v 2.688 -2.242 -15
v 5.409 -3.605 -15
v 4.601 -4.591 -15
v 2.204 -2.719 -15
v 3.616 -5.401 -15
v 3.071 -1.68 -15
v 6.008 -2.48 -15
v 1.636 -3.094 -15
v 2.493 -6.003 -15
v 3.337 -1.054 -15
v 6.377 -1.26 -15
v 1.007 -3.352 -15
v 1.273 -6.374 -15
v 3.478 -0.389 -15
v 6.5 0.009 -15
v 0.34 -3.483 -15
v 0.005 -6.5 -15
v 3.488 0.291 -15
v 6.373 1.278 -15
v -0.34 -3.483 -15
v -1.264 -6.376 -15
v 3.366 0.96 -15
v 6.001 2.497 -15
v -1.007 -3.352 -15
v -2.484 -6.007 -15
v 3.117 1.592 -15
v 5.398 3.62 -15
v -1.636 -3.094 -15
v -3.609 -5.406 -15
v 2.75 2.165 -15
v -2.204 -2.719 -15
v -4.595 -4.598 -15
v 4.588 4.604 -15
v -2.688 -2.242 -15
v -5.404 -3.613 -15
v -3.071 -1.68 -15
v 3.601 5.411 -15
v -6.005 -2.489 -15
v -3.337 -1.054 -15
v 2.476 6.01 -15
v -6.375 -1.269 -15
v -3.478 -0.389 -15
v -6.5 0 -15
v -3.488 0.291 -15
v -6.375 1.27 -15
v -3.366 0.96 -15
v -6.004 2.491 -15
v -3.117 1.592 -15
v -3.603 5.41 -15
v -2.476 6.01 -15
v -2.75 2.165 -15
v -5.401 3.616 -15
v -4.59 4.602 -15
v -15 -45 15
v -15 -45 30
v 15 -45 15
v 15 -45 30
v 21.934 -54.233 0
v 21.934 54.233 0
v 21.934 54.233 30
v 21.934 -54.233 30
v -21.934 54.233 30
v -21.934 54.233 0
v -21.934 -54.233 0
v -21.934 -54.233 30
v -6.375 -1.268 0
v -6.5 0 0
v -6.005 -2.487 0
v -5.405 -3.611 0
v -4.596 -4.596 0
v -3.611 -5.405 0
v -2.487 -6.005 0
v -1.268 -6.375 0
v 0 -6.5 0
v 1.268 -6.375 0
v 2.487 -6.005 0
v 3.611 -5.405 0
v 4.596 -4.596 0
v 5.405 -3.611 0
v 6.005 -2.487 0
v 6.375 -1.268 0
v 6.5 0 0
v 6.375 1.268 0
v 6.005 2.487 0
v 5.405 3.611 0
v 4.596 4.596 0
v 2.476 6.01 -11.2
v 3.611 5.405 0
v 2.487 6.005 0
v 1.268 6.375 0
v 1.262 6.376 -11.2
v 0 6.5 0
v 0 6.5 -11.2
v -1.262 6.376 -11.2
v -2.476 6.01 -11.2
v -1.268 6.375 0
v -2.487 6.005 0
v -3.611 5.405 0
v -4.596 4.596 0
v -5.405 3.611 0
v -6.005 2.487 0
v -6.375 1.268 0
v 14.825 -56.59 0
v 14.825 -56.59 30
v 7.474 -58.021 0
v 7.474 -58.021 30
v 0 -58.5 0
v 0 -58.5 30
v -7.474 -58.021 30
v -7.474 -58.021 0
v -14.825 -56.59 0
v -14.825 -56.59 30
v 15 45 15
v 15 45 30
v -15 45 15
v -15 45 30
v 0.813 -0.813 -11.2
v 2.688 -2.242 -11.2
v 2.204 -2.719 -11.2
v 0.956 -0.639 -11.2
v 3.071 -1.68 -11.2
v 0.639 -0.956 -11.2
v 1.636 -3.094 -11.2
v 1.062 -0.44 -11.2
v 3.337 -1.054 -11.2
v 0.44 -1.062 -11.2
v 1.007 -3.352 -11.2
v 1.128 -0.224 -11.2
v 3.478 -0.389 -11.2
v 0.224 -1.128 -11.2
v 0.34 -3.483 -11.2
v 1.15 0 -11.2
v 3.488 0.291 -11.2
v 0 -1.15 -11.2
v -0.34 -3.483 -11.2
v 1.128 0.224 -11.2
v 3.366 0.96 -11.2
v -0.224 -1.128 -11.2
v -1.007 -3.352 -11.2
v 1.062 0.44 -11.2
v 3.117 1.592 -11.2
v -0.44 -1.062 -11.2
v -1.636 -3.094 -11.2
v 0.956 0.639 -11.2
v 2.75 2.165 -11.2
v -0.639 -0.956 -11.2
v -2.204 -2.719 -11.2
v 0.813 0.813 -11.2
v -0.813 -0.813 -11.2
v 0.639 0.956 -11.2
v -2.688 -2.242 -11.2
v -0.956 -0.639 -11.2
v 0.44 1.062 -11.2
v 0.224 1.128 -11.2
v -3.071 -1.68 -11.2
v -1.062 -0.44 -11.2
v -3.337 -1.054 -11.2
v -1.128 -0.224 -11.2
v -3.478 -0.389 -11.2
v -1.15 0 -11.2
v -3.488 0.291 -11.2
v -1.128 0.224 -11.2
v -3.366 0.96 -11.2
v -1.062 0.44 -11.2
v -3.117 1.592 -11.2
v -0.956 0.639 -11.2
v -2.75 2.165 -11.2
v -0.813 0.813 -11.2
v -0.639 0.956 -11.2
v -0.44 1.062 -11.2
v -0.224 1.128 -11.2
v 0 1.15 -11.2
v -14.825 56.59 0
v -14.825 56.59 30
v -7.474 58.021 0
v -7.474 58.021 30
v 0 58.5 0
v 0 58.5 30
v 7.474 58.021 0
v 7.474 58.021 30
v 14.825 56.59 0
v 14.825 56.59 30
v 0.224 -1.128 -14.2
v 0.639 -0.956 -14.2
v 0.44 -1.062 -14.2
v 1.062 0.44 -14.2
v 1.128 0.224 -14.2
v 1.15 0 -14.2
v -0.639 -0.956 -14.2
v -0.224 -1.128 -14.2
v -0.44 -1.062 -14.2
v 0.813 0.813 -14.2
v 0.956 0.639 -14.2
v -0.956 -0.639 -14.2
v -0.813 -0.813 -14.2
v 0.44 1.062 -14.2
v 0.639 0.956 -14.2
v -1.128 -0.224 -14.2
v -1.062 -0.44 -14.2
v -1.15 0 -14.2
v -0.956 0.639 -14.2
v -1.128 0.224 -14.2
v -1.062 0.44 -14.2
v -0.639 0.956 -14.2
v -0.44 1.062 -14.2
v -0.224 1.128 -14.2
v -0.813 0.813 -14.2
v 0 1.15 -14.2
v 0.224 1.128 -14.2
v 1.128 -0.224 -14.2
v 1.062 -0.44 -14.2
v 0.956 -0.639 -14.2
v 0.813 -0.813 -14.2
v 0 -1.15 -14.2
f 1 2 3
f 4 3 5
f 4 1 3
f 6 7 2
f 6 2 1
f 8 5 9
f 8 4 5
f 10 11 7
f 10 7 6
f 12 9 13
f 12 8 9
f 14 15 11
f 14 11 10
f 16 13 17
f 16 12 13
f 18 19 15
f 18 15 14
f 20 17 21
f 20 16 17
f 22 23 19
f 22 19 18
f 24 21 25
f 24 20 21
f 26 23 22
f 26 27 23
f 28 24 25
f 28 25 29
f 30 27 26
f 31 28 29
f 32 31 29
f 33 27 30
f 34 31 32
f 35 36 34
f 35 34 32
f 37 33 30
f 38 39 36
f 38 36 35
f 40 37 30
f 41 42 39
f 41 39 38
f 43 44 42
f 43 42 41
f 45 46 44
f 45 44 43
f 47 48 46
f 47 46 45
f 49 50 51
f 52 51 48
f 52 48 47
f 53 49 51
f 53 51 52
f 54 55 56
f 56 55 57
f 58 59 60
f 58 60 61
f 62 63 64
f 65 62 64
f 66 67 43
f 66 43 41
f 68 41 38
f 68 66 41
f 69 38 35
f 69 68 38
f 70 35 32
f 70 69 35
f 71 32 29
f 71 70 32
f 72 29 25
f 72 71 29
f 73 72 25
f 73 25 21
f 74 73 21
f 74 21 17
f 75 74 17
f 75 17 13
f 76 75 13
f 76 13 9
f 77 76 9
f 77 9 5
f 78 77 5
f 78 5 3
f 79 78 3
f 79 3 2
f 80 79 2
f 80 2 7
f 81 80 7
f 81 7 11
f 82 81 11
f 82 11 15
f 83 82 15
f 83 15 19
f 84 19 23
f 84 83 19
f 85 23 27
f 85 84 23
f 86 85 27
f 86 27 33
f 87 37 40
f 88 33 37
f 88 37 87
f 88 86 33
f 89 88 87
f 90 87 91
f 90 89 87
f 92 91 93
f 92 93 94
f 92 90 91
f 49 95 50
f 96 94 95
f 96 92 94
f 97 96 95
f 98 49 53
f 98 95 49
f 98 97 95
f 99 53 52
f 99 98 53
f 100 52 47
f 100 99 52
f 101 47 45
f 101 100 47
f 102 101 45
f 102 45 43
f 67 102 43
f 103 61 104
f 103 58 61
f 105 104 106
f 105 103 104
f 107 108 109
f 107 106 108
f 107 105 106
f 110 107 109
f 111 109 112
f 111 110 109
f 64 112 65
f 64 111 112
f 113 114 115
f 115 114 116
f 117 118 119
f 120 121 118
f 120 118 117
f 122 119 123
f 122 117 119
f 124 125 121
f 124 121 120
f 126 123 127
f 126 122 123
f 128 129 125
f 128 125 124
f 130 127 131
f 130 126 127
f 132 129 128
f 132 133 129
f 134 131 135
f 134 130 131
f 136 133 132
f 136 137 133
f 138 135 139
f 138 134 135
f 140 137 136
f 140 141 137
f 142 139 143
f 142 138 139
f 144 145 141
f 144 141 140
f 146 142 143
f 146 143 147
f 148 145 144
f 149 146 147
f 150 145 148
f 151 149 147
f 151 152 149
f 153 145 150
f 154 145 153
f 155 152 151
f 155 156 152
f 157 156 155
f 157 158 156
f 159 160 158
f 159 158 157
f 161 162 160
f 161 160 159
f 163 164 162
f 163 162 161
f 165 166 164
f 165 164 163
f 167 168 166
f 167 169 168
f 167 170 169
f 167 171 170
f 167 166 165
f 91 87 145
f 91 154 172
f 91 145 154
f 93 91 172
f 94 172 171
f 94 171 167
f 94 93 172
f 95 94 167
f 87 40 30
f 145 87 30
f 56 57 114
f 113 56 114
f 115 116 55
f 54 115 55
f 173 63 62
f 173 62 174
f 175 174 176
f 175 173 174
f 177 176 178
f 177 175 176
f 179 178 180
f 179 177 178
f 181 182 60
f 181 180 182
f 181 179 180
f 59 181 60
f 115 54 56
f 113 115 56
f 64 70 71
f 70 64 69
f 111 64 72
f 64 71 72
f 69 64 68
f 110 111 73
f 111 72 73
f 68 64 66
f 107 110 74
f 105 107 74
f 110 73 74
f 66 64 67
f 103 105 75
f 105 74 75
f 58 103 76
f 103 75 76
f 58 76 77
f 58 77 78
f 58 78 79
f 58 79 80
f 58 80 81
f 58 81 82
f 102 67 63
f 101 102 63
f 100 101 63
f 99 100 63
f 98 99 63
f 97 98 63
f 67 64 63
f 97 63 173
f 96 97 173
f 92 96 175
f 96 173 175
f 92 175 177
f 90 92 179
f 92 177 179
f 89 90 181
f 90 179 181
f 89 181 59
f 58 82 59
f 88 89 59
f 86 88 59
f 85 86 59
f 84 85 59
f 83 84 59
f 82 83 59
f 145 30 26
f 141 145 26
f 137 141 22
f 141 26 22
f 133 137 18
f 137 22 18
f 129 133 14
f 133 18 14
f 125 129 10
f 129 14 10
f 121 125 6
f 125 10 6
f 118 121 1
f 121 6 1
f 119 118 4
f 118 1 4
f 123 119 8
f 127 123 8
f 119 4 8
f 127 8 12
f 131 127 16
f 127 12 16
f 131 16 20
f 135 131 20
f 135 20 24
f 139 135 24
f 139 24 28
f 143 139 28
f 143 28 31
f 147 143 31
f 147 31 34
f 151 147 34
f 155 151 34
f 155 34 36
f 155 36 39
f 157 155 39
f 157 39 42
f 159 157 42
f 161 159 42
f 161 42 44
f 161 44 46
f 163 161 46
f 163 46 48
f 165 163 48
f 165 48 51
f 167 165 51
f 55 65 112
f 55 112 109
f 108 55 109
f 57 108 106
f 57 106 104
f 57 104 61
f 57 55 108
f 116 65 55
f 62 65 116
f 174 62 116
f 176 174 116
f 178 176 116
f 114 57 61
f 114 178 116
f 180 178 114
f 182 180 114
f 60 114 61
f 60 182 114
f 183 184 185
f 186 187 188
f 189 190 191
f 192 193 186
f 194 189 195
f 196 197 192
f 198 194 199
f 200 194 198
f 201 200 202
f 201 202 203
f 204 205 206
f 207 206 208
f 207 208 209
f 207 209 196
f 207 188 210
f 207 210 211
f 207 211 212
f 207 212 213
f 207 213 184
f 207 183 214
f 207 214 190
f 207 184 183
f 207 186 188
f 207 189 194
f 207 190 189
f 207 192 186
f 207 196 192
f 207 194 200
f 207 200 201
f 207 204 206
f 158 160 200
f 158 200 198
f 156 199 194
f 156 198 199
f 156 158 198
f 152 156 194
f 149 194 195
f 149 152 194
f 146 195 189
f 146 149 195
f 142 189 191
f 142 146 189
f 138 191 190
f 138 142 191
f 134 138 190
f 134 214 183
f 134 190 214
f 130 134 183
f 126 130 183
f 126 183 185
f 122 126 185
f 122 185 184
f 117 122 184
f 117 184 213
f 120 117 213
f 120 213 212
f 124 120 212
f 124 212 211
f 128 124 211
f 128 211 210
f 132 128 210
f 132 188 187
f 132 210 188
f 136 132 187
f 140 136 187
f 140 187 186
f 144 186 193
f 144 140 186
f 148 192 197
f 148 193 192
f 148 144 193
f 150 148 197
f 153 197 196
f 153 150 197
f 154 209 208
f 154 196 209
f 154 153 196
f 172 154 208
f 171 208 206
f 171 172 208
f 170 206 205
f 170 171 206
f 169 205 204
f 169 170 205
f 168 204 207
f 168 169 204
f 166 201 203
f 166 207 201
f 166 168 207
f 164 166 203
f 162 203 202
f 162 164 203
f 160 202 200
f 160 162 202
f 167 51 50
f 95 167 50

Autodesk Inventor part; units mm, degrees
ref_plane "YZ Plane" through (0, 0, 0) normal (1, 0, 0) x (0, 1, 0)
ref_plane "XZ Plane" through (0, 0, 0) normal (0, 1, 0) x (-1, 0, 0)
ref_plane "XY Plane" through (0, 0, 0) normal (0, 0, 1) x (1, 0, 0)
sketch "Sketch1" plane through (0, 0, 0) normal (0, 0, 1) x (1, 0, 0)
  circle A0 centre (0, 0) radius 58.5
  line L0 (0, 0) -> (0, 58.5) construction
  line L1 (0, 0) -> (-58.5, 0) construction
  line L2 (-21.9335, 54.2326) -> (-21.9335, -54.2326)
  line L3 (21.9335, 54.2326) -> (21.9335, -54.2326)
  point P0 (-54.2326, 21.9335)
  point P1 (54.2326, 21.9335)
  dimension "d0" = 117
  dimension "d53" = 21.9335
extrude "Extrusion1" add sketch "Sketch1" along normal blind 30 contours L3 A0 L2
sketch "Sketch2" plane through (0, 0, 0) normal (0, 0, -1) x (-1, 0, 0)
  circle A0 centre (0, 0) radius 6.5
  dimension "d4" = 13
extrude "Extrusion2" add sketch "Sketch2" along normal blind 15
sketch "Sketch6" plane through (0, 0, -15) normal (0, 0, -1) x (-1, 0, 0)
  circle A0 centre (0, 0) radius 1.15
  circle A1 centre (0, 0) radius 1.15
  line L0 (18.75, 0) -> (16.35, 0) construction
  line L1 (16.35, 0) -> (0, 0) construction
  line L2 (0, 0) -> (0, 3.75) construction
  circle A2 centre (0, 0) radius 3.9
  circle A3 centre (16.35, 0) radius 2.55
  line L3 (16.35, 2.55) -> (0.3241, 3.8865)
  line L4 (16.35, -2.55) -> (0.3241, -3.8865)
  point P0 (0, 3.75)
  dimension "d21" = 2.4
  dimension "d24" = 2.3
  dimension "d27" = 7.8
  dimension "d28" = 5.1
  dimension "d29" = 16.0259
  dimension "d30" = 16.0259
extrude "Extrusion5" [suppressed]
sketch "Sketch7" plane through (0, 0, -12.2) normal (0, 0, -1) x (-1, 0, 0)
  circle A0 centre (0, 0) radius 1.15
  dimension "d33" = 2.3
extrude "Extrusion6" [suppressed]
sketch "Sketch8" plane through (0, 0, 30) normal (0, 0, 1) x (1, 0, 0)
  line L0 (0, 0) -> (21.9335, 0) construction
  line L1 (0, 0) -> (15, 0)
  line L2 (15, 0) -> (15, 45)
  line L3 (15, 45) -> (-15, 45)
  line L4 (-15, 45) -> (-15, 0)
  line L5 (-15, 0) -> (0, 0)
  line L6 (-15, 0) -> (-15, -45)
  line L7 (-15, -45) -> (15, -45)
  line L8 (15, -45) -> (15, 0)
  dimension "d43" = 15
  dimension "d44" = 45
  dimension "d45" = 30
  dimension "d46" = 45
  dimension "d47" = 30
extrude "Extrusion7" cut sketch "Sketch8" against normal blind 15
sketch "Sketch9" plane through (0, 0, -15) normal (0, 0, -1) x (-1, 0, 0)
  circle A0 centre (0, 0) radius 3.5
  arc A1 (1.9, 14.1) -> (-1.8987, 14.0987) centre (0.0007, 14.05) ccw
  line L0 (0.0007, 15.95) -> (0.0007, 14.05)
  line L1 (0.0007, 14.05) -> (0, 0)
  circle A2 centre (0.0007, 14.05) radius 1.9
  line L2 (-1.8987, 14.0987) -> (-2.75, 2.1651)
  line L3 (-2.75, 2.1651) -> (-1.8987, 14.0987)
  line L4 (2.75, 2.1651) -> (1.9, 14.1)
  line L5 (2.75, 2.1651) -> (1.9, 14.1)
extrude "Extrusion8" cut sketch "Sketch9" against normal blind 3.8
sketch "Sketch10" plane through (0, 0, -11.2) normal (0, 0, -1) x (-1, 0, 0)
  circle A0 centre (0, 0) radius 1.15
  dimension "d50" = 2.3
extrude "Extrusion9" add sketch "Sketch10" along normal blind 3
properties part number "Sorting Gate Edited"
